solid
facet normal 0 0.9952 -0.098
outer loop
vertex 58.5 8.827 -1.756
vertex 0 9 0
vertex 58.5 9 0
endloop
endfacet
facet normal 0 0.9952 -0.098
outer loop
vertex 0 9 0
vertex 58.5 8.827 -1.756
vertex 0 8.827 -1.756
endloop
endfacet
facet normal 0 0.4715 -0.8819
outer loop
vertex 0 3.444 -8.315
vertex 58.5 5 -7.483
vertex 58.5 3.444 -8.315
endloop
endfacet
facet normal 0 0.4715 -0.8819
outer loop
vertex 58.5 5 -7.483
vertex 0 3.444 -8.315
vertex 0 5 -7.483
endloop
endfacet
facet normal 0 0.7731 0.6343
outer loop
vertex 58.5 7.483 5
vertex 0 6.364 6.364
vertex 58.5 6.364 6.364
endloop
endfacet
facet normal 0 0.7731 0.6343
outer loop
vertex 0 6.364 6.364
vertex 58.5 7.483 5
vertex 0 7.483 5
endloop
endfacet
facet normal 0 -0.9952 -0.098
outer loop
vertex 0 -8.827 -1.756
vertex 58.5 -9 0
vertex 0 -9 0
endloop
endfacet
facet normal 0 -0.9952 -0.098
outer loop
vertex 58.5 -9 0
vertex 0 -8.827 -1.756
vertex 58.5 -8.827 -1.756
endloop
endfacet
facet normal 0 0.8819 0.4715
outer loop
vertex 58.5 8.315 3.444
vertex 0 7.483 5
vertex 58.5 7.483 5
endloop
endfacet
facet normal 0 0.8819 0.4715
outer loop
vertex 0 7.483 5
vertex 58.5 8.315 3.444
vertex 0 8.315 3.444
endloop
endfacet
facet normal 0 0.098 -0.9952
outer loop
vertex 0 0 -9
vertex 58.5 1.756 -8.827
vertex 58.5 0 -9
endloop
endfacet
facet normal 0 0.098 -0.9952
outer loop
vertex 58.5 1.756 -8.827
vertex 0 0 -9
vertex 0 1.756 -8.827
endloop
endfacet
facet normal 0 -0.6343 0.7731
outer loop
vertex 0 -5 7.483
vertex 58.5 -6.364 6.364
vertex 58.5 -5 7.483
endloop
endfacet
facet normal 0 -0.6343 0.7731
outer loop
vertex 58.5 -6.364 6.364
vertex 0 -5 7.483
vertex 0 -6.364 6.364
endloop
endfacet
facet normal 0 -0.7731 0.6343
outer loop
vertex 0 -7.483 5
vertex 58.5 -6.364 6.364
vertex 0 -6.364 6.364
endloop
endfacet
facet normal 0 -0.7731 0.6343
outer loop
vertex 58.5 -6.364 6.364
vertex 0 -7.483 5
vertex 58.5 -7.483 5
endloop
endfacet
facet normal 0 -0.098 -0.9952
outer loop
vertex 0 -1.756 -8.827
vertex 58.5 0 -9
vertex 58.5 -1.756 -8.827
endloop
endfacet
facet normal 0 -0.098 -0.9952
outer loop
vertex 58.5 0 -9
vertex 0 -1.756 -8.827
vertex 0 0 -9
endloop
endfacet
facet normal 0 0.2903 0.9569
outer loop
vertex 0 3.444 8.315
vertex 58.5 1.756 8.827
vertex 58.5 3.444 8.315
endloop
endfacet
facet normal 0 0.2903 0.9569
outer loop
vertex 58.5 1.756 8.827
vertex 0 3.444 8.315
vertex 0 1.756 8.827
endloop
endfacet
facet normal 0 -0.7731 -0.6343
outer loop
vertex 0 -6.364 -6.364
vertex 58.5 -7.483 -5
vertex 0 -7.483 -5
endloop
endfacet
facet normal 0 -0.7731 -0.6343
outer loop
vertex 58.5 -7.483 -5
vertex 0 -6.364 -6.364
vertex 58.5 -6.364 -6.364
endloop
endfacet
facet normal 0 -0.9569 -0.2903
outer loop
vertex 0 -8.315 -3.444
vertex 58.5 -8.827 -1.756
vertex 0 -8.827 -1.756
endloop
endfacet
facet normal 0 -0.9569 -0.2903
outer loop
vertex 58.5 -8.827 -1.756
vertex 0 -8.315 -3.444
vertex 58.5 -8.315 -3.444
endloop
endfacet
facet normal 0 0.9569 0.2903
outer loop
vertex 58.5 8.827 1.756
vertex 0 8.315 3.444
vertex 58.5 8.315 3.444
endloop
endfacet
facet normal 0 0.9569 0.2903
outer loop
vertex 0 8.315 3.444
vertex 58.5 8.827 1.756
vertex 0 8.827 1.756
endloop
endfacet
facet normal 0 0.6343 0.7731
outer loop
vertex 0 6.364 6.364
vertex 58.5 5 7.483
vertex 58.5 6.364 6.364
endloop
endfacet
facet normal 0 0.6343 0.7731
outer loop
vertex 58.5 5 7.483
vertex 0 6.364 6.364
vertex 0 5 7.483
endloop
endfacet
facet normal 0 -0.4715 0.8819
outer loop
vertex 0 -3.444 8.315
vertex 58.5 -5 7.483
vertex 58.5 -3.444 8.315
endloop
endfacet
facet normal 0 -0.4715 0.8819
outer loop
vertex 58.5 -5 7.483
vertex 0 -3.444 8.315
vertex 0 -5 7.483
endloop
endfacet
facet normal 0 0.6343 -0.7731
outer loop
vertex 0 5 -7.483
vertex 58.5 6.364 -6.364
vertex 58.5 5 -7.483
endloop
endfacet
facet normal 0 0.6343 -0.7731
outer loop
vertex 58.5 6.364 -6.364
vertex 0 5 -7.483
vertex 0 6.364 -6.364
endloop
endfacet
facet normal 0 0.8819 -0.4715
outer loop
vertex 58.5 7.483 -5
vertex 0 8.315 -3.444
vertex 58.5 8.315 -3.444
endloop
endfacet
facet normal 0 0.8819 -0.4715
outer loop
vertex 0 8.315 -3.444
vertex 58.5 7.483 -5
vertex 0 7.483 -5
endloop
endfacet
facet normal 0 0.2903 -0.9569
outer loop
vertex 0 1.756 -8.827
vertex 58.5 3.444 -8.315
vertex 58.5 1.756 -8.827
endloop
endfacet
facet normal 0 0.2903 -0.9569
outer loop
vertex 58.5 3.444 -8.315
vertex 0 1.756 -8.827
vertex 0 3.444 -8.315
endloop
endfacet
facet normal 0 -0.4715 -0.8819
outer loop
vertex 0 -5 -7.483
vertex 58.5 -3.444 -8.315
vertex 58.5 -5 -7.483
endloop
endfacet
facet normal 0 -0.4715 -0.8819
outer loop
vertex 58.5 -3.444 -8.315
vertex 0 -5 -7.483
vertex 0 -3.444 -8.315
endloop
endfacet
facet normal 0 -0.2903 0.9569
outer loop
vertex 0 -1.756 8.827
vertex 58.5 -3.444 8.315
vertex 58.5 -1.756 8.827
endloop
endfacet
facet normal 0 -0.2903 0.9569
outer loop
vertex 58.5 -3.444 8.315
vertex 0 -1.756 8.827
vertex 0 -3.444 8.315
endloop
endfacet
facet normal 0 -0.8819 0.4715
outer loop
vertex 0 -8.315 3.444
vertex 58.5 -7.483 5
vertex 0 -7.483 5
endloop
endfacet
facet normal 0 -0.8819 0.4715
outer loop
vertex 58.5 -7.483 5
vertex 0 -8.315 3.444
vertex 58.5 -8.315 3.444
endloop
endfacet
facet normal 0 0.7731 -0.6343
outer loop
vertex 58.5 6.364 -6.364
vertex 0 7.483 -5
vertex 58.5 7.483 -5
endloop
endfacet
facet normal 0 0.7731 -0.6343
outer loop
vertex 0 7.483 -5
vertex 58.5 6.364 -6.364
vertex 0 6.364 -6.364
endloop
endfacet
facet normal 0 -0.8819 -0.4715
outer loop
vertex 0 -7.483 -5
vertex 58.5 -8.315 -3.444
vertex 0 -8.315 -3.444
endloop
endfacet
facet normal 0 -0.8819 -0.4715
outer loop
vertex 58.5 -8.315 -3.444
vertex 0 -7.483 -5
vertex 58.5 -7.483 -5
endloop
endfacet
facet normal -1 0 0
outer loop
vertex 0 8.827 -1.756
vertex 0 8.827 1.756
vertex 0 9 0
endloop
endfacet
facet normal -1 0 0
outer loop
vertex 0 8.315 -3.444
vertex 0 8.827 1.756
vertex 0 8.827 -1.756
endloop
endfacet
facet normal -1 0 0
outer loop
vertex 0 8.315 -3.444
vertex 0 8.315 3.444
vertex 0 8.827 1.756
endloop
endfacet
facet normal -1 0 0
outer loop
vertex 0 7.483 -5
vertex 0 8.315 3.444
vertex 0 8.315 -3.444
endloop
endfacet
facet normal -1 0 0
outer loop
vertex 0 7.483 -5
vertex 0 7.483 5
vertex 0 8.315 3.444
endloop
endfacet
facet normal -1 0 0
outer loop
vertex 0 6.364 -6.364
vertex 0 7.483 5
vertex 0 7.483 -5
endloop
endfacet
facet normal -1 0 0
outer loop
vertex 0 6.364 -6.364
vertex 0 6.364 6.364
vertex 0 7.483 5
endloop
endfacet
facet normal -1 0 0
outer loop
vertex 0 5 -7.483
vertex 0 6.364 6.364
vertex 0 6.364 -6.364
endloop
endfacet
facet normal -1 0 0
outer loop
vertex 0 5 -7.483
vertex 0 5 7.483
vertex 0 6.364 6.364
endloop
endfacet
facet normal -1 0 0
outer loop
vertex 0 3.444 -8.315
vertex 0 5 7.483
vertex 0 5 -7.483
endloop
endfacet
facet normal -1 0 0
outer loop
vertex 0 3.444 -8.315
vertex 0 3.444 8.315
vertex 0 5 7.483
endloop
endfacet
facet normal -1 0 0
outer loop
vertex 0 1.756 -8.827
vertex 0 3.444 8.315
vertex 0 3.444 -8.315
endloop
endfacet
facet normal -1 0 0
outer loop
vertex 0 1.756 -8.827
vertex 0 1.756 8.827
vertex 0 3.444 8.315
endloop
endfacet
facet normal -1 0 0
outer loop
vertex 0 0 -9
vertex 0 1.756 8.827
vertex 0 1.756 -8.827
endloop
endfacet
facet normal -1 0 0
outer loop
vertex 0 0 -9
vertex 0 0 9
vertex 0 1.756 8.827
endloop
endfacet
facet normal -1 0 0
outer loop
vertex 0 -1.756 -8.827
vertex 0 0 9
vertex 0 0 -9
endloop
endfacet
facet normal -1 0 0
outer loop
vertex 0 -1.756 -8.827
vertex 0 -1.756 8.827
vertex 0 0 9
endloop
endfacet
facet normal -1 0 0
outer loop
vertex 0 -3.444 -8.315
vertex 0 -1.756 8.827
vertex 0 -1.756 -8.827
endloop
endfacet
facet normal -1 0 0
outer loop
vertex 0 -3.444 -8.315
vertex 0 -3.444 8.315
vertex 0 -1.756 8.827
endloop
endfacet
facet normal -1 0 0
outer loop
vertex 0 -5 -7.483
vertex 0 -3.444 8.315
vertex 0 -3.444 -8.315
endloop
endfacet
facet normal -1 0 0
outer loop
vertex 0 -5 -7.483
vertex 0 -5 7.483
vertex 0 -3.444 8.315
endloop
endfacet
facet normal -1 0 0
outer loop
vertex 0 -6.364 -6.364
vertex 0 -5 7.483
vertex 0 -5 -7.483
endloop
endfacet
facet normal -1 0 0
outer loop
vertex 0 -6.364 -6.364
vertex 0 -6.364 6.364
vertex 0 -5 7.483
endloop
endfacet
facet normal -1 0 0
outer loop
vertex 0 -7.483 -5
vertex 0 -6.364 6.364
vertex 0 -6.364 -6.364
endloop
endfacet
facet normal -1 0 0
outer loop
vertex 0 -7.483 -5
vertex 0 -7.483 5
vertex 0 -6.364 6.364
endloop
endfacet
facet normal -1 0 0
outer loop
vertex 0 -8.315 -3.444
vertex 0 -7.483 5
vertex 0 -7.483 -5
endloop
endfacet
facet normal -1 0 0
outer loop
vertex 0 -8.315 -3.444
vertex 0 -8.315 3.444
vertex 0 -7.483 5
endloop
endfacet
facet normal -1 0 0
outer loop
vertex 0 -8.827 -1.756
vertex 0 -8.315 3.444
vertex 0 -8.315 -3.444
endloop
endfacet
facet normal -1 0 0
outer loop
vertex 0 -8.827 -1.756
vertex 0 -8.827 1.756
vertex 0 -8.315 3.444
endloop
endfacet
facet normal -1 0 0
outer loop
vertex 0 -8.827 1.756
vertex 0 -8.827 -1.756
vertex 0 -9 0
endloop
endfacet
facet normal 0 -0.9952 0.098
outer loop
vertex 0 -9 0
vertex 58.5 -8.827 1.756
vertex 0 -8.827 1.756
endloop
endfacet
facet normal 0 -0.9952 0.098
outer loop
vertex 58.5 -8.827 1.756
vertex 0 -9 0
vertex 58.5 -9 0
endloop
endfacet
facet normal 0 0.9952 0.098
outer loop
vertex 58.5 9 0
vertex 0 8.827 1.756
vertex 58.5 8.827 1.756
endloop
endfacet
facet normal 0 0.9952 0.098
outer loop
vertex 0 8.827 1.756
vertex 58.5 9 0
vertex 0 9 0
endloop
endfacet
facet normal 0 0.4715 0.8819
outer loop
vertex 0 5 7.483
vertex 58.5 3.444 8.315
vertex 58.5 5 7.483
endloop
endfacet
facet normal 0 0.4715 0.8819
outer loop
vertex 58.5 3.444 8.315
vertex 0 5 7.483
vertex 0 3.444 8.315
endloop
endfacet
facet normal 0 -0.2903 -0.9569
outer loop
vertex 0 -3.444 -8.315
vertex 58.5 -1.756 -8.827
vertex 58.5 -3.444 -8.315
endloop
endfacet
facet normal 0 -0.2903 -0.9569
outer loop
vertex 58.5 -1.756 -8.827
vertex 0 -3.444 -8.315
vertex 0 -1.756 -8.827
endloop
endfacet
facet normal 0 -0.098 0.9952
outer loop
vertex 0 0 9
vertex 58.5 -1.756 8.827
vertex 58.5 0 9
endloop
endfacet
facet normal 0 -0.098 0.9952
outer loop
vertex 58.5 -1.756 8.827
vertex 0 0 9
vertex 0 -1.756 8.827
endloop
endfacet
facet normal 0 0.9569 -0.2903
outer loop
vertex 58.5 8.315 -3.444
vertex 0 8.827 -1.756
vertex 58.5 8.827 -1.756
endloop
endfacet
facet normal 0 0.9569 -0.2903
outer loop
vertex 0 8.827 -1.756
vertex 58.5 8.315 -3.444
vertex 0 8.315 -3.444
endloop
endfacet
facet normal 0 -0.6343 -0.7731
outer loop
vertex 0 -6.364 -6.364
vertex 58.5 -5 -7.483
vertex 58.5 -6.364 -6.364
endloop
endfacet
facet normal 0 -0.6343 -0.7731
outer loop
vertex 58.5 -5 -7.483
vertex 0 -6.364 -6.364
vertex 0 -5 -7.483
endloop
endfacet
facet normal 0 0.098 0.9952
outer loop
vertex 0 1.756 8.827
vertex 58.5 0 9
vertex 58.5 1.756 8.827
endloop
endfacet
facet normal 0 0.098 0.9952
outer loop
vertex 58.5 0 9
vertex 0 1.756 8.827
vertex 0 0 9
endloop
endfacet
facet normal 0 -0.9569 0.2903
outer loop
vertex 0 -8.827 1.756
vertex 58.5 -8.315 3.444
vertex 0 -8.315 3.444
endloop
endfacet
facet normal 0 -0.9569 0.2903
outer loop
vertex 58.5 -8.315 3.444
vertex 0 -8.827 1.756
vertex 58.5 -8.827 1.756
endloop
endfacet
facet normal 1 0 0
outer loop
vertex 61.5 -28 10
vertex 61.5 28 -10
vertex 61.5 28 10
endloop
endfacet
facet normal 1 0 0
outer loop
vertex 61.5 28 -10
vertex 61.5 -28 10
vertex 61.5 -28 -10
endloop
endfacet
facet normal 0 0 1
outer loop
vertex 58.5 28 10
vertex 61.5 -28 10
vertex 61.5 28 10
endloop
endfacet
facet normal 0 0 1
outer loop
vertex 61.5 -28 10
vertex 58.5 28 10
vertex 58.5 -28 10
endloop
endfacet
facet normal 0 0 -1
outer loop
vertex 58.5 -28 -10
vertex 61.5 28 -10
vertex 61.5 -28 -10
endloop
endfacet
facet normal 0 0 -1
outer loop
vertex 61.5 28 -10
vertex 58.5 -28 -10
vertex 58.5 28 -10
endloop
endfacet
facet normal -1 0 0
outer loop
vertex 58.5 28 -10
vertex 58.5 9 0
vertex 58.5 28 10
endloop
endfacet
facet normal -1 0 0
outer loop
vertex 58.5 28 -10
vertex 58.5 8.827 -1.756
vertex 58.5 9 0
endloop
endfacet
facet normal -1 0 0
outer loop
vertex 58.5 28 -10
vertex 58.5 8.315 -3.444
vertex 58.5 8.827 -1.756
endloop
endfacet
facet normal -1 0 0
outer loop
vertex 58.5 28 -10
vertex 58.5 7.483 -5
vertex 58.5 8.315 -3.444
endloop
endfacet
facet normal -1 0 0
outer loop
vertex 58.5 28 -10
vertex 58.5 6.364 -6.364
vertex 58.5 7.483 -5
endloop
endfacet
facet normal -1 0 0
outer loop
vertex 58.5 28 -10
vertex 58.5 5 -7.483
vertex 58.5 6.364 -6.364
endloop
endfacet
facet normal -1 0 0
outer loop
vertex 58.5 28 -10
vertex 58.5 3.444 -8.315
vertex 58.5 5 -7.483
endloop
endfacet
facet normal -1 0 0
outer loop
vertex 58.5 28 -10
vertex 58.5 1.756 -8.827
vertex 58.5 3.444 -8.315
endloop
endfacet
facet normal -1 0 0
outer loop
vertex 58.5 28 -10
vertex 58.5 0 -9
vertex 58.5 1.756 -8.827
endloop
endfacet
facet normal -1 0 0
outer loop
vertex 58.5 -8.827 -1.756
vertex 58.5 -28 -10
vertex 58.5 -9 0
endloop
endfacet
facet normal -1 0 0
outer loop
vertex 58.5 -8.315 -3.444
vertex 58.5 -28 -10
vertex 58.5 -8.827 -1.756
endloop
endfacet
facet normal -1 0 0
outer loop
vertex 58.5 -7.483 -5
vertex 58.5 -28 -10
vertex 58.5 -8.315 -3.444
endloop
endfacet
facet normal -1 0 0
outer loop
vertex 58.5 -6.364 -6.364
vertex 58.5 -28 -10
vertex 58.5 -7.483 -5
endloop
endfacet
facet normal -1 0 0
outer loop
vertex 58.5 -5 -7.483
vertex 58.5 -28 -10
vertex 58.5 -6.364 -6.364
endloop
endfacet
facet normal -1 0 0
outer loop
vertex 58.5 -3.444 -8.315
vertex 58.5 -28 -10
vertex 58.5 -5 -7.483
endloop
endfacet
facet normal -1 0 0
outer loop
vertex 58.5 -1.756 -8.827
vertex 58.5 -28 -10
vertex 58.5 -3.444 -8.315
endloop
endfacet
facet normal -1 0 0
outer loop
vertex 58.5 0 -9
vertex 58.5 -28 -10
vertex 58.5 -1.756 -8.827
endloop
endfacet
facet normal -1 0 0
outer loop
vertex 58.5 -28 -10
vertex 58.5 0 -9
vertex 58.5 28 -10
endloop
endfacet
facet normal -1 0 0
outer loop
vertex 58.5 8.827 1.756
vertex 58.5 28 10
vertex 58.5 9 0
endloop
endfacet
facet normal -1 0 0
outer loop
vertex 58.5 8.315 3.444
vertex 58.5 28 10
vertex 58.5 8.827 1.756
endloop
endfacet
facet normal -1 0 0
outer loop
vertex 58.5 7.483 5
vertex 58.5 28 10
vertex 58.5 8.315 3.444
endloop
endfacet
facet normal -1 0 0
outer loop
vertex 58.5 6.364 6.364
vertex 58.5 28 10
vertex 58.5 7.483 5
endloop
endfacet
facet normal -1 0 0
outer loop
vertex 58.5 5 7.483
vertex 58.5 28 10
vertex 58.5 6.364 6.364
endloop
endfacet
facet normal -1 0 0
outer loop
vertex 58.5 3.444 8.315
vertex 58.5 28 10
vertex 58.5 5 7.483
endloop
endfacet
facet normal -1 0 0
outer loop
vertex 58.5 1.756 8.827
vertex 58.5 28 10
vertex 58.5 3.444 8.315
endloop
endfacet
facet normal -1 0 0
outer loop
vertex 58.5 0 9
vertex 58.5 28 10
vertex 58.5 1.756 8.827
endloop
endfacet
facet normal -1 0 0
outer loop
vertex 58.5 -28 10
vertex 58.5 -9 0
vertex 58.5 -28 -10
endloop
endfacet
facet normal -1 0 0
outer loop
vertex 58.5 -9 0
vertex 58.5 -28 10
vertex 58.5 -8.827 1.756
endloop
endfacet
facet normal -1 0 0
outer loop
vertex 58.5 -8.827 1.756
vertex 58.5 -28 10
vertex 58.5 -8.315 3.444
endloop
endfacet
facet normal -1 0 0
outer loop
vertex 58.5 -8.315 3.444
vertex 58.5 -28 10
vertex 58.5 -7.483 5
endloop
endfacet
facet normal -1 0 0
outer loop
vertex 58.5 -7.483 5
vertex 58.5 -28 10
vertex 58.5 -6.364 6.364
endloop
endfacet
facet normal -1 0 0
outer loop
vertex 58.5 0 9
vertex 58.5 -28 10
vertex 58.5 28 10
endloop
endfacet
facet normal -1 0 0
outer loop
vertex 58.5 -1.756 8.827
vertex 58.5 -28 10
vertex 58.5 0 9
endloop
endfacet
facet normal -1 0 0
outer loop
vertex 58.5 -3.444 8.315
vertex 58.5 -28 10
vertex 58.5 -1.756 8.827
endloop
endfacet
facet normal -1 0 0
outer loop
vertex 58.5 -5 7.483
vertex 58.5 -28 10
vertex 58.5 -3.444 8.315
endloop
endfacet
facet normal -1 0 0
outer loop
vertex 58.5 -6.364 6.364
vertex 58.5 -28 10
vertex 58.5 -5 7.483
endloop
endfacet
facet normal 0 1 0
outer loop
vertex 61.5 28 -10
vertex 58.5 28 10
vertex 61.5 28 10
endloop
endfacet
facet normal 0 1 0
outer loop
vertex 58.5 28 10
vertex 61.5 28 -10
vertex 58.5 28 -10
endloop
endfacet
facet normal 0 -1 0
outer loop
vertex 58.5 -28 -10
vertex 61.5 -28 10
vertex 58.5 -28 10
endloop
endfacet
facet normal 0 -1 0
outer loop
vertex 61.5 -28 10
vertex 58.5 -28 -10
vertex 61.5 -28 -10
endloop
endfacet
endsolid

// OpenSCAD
// Horizontal sidewall K=8.0 — throws water to one side of corridor.
size_in = 0.75;
frame_d = 18;
body_l = 60;
deflector_w = 56;
deflector_h = 20;
rotate([0, 90, 0])
    cylinder(h = body_l, d = frame_d, $fn = 32);
translate([body_l, 0, 0])
    cube(size = [3, deflector_w, deflector_h], center = true);
